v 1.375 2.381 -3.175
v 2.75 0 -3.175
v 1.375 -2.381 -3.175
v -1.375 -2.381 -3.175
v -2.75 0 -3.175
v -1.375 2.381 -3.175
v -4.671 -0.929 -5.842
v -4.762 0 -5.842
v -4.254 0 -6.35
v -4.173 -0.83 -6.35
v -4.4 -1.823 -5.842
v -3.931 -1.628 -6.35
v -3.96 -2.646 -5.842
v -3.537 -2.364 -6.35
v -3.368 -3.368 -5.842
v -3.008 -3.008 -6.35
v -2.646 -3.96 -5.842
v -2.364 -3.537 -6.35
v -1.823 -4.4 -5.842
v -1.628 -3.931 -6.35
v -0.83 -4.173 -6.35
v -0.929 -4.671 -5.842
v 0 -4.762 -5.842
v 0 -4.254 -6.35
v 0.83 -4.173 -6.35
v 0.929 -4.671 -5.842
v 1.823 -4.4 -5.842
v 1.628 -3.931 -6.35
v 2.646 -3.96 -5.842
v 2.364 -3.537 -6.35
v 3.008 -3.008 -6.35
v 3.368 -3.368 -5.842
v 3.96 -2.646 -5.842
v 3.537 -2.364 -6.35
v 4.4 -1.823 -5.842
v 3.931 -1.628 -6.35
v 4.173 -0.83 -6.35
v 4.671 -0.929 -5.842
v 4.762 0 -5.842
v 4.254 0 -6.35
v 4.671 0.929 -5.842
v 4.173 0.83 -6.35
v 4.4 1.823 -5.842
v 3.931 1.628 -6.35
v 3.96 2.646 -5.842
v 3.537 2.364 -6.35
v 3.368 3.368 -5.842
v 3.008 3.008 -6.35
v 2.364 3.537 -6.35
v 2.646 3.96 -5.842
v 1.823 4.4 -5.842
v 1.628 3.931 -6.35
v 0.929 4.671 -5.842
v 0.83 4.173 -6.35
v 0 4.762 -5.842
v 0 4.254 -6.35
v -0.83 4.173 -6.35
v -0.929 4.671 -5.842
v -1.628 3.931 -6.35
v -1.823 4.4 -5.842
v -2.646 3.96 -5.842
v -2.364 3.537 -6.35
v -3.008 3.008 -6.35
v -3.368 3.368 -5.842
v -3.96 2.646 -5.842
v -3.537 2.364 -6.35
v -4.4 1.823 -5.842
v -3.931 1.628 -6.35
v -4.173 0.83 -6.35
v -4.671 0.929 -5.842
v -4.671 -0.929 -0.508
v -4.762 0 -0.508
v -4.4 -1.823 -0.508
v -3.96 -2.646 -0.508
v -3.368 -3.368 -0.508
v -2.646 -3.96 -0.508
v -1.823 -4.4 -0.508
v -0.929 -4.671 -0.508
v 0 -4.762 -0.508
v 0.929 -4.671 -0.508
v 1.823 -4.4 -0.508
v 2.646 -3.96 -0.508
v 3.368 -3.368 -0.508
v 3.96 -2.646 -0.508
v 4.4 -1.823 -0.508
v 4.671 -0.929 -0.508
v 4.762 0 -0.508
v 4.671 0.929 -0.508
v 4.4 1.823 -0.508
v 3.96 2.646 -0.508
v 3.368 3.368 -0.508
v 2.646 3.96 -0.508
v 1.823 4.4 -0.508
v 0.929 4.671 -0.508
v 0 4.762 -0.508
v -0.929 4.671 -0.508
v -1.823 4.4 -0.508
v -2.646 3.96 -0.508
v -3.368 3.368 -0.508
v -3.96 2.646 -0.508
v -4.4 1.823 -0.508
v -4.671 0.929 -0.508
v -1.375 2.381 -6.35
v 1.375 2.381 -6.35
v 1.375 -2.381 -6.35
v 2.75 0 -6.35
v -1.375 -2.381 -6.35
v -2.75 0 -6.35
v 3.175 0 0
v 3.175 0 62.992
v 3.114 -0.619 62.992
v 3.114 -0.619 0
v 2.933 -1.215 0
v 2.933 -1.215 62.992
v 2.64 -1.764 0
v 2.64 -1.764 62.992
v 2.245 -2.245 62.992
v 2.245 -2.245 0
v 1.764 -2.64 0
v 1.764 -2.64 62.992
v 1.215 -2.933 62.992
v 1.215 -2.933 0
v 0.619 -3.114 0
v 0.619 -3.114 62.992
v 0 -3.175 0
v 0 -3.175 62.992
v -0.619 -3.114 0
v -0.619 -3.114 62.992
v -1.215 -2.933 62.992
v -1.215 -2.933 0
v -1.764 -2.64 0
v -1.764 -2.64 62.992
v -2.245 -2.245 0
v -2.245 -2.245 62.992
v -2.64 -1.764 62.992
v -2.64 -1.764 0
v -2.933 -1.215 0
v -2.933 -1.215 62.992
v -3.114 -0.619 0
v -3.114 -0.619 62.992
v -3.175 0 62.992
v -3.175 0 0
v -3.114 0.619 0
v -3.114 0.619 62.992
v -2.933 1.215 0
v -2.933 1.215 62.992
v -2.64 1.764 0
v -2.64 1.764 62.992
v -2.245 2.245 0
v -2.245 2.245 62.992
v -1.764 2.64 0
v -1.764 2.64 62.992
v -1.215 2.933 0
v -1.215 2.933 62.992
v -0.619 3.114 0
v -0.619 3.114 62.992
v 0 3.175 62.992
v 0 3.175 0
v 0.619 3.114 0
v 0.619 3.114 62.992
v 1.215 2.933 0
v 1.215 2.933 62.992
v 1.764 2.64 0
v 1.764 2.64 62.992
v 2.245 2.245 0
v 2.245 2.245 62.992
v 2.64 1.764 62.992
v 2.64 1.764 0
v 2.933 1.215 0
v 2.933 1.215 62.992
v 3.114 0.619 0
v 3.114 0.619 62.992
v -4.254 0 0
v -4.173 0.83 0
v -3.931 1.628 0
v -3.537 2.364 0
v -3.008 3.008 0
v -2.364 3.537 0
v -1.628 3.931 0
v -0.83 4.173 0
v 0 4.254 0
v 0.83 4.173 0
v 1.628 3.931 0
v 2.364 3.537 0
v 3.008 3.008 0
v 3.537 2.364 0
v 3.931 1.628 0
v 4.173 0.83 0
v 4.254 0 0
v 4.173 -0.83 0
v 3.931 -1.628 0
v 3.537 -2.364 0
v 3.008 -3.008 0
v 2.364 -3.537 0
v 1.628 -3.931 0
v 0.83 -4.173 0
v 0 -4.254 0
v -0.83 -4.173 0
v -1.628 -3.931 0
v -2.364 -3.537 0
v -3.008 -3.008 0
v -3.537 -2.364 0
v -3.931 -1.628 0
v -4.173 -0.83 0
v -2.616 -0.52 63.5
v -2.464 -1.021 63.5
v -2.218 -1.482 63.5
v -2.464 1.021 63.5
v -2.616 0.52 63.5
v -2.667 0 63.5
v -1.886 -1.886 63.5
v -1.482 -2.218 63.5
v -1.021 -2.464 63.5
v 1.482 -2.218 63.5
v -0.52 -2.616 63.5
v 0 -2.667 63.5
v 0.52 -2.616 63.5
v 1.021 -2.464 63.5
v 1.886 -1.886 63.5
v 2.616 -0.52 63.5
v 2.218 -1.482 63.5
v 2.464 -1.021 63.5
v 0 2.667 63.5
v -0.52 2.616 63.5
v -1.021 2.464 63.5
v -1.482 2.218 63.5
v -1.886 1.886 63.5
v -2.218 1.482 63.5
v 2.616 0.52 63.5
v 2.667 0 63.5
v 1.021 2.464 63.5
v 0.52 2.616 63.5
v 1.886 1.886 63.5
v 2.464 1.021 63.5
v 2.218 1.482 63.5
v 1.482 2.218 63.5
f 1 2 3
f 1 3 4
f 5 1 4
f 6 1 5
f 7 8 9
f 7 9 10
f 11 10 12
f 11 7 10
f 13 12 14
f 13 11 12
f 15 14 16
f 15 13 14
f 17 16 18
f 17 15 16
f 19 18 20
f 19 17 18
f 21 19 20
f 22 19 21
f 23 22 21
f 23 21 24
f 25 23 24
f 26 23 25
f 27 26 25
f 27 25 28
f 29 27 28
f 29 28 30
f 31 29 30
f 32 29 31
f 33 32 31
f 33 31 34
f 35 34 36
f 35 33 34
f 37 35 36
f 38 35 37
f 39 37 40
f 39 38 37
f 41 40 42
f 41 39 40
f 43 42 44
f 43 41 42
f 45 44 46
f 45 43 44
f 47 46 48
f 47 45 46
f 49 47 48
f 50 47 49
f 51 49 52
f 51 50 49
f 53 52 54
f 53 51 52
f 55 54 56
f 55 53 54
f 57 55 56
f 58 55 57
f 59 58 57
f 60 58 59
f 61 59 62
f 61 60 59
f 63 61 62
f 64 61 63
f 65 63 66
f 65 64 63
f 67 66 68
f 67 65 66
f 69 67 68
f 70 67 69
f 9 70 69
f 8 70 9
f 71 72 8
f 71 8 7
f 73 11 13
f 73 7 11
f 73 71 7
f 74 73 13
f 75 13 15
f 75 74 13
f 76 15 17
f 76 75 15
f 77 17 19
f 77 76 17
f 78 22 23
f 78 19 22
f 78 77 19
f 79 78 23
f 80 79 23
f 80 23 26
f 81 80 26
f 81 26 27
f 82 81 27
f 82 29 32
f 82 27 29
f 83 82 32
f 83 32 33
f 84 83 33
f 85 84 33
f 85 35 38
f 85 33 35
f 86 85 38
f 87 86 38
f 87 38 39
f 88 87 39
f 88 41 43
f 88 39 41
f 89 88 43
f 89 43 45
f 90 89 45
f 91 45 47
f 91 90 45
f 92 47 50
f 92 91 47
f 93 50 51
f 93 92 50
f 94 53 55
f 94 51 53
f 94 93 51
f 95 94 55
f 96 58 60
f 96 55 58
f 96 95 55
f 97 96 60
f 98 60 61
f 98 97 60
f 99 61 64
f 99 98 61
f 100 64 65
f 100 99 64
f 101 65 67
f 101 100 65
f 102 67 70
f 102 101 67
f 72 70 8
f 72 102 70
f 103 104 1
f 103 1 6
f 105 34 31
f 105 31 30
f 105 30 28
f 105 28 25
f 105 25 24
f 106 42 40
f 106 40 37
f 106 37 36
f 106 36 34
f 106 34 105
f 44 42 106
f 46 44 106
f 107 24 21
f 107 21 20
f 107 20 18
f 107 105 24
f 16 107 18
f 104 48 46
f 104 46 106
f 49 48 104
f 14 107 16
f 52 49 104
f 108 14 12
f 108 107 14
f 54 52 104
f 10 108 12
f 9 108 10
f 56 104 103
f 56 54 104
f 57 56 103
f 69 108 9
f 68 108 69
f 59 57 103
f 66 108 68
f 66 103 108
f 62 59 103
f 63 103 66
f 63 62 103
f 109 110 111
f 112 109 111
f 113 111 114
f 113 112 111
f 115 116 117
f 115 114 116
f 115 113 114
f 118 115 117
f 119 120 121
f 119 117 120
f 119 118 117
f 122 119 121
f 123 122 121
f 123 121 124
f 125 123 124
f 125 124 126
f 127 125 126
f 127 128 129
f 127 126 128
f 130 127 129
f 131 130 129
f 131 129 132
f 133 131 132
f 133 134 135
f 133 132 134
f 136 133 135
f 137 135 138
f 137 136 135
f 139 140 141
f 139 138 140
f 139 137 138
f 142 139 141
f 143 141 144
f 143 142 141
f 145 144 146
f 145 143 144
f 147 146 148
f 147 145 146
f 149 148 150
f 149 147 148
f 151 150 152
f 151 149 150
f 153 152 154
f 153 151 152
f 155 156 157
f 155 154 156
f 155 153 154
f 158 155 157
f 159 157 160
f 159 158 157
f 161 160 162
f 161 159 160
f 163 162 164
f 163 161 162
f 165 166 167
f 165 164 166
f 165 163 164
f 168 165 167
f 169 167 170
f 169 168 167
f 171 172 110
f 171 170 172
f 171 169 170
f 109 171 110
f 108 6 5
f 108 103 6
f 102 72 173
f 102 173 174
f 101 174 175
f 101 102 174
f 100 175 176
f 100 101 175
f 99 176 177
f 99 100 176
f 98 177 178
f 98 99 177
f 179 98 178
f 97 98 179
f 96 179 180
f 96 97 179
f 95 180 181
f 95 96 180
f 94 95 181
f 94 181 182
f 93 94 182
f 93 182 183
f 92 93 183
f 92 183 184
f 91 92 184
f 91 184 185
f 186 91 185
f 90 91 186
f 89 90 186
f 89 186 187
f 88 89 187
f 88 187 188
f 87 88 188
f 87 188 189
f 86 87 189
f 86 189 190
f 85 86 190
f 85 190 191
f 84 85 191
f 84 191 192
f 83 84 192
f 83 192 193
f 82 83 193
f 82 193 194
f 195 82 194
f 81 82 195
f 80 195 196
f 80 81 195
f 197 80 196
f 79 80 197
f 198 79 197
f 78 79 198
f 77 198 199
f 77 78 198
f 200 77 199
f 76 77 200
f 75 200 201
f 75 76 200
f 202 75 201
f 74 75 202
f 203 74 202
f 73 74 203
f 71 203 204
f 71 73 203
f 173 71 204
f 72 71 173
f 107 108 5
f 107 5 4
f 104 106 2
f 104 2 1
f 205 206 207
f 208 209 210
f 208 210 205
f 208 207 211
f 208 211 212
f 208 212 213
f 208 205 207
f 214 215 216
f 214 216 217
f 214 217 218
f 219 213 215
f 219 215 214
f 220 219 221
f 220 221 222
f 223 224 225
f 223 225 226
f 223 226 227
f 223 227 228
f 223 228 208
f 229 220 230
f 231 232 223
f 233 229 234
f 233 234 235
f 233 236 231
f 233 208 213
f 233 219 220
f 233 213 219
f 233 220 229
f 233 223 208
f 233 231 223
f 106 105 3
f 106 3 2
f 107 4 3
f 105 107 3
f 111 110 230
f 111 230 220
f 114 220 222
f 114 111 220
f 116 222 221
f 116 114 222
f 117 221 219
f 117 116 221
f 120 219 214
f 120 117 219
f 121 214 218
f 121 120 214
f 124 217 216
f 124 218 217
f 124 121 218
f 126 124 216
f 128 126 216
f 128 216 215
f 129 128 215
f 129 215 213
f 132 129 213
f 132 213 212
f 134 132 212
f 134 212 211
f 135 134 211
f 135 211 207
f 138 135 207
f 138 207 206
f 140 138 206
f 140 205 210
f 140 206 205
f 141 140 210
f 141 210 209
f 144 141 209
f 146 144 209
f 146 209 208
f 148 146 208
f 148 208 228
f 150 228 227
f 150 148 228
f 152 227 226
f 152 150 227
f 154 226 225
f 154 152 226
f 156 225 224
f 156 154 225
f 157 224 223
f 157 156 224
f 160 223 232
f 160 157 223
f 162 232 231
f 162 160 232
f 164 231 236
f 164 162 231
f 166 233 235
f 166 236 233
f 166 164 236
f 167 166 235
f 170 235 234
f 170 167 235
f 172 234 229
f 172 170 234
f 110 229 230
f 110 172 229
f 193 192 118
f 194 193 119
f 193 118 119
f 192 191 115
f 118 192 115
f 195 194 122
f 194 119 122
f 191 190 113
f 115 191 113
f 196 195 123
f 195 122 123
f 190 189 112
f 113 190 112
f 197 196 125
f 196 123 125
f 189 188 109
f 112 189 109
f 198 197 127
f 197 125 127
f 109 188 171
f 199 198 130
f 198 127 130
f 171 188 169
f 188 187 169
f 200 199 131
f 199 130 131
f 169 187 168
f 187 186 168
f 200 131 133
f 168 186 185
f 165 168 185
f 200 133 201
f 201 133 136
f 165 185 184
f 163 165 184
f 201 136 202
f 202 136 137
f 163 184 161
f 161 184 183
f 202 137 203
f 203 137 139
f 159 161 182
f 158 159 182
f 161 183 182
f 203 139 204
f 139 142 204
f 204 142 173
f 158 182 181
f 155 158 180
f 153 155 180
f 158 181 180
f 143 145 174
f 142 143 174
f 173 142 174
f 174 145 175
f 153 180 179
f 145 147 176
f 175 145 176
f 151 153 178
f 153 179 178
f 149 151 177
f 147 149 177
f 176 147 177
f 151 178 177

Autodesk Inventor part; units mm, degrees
ref_plane "YZ Plane" through (0, 0, 0) normal (1, 0, 0) x (0, 1, 0)
ref_plane "XZ Plane" through (0, 0, 0) normal (0, 1, 0) x (-1, 0, 0)
ref_plane "XY Plane" through (0, 0, 0) normal (0, 0, 1) x (1, 0, 0)
sketch "Sketch1" plane through (0, 0, 0) normal (0, 0, 1) x (1, 0, 0)
  circle A0 centre (0, 0) radius 3.175
  dimension "d0" = 6.35
extrude "Extrusion1" add sketch "Sketch1" along normal blind 63.5
sketch "Sketch2" plane through (0, 0, 0) normal (0, 0, -1) x (-1, 0, 0)
  circle A0 centre (0, 0) radius 3.175 projected
  circle A1 centre (0, 0) radius 4.7625
  dimension "d3" = 9.525
extrude "Extrusion2" add sketch "Sketch2" along normal blind 6.35 contours A0 | A1
sketch "Sketch3" plane through (0, 0, -6.35) normal (0, 0, -1) x (-1, 0, 0)
  circle A0 centre (0, 0) radius 4.7625 projected
  line L0 (-1.3748, 2.3812) -> (1.3748, 2.3813)
  line L1 (1.3748, 2.3813) -> (2.7496, 0)
  line L2 (2.7496, 0) -> (1.3748, -2.3812)
  line L3 (1.3748, -2.3812) -> (-1.3748, -2.3812)
  line L4 (-1.3748, -2.3812) -> (-2.7496, 0)
  line L5 (-2.7496, 0) -> (-1.3748, 2.3812)
  dimension "d6" = 4.7625
extrude "Extrusion3" cut sketch "Sketch3" against normal blind 3.175 contours L0 L1 L2 L3 L4 L5
chamfer "Chamfer1" distance 0.508 angle 45 3 edges at (-3.175, 0, 63.5) (4.7625, 0, 0) (4.7625, 0, -6.35)
thread "Thread1" size "1/4-20 UNC" class "2A" standard "ANSI Unified Screw Threads" length 25.4
properties part number "14-20 x2500" material "Steel"
